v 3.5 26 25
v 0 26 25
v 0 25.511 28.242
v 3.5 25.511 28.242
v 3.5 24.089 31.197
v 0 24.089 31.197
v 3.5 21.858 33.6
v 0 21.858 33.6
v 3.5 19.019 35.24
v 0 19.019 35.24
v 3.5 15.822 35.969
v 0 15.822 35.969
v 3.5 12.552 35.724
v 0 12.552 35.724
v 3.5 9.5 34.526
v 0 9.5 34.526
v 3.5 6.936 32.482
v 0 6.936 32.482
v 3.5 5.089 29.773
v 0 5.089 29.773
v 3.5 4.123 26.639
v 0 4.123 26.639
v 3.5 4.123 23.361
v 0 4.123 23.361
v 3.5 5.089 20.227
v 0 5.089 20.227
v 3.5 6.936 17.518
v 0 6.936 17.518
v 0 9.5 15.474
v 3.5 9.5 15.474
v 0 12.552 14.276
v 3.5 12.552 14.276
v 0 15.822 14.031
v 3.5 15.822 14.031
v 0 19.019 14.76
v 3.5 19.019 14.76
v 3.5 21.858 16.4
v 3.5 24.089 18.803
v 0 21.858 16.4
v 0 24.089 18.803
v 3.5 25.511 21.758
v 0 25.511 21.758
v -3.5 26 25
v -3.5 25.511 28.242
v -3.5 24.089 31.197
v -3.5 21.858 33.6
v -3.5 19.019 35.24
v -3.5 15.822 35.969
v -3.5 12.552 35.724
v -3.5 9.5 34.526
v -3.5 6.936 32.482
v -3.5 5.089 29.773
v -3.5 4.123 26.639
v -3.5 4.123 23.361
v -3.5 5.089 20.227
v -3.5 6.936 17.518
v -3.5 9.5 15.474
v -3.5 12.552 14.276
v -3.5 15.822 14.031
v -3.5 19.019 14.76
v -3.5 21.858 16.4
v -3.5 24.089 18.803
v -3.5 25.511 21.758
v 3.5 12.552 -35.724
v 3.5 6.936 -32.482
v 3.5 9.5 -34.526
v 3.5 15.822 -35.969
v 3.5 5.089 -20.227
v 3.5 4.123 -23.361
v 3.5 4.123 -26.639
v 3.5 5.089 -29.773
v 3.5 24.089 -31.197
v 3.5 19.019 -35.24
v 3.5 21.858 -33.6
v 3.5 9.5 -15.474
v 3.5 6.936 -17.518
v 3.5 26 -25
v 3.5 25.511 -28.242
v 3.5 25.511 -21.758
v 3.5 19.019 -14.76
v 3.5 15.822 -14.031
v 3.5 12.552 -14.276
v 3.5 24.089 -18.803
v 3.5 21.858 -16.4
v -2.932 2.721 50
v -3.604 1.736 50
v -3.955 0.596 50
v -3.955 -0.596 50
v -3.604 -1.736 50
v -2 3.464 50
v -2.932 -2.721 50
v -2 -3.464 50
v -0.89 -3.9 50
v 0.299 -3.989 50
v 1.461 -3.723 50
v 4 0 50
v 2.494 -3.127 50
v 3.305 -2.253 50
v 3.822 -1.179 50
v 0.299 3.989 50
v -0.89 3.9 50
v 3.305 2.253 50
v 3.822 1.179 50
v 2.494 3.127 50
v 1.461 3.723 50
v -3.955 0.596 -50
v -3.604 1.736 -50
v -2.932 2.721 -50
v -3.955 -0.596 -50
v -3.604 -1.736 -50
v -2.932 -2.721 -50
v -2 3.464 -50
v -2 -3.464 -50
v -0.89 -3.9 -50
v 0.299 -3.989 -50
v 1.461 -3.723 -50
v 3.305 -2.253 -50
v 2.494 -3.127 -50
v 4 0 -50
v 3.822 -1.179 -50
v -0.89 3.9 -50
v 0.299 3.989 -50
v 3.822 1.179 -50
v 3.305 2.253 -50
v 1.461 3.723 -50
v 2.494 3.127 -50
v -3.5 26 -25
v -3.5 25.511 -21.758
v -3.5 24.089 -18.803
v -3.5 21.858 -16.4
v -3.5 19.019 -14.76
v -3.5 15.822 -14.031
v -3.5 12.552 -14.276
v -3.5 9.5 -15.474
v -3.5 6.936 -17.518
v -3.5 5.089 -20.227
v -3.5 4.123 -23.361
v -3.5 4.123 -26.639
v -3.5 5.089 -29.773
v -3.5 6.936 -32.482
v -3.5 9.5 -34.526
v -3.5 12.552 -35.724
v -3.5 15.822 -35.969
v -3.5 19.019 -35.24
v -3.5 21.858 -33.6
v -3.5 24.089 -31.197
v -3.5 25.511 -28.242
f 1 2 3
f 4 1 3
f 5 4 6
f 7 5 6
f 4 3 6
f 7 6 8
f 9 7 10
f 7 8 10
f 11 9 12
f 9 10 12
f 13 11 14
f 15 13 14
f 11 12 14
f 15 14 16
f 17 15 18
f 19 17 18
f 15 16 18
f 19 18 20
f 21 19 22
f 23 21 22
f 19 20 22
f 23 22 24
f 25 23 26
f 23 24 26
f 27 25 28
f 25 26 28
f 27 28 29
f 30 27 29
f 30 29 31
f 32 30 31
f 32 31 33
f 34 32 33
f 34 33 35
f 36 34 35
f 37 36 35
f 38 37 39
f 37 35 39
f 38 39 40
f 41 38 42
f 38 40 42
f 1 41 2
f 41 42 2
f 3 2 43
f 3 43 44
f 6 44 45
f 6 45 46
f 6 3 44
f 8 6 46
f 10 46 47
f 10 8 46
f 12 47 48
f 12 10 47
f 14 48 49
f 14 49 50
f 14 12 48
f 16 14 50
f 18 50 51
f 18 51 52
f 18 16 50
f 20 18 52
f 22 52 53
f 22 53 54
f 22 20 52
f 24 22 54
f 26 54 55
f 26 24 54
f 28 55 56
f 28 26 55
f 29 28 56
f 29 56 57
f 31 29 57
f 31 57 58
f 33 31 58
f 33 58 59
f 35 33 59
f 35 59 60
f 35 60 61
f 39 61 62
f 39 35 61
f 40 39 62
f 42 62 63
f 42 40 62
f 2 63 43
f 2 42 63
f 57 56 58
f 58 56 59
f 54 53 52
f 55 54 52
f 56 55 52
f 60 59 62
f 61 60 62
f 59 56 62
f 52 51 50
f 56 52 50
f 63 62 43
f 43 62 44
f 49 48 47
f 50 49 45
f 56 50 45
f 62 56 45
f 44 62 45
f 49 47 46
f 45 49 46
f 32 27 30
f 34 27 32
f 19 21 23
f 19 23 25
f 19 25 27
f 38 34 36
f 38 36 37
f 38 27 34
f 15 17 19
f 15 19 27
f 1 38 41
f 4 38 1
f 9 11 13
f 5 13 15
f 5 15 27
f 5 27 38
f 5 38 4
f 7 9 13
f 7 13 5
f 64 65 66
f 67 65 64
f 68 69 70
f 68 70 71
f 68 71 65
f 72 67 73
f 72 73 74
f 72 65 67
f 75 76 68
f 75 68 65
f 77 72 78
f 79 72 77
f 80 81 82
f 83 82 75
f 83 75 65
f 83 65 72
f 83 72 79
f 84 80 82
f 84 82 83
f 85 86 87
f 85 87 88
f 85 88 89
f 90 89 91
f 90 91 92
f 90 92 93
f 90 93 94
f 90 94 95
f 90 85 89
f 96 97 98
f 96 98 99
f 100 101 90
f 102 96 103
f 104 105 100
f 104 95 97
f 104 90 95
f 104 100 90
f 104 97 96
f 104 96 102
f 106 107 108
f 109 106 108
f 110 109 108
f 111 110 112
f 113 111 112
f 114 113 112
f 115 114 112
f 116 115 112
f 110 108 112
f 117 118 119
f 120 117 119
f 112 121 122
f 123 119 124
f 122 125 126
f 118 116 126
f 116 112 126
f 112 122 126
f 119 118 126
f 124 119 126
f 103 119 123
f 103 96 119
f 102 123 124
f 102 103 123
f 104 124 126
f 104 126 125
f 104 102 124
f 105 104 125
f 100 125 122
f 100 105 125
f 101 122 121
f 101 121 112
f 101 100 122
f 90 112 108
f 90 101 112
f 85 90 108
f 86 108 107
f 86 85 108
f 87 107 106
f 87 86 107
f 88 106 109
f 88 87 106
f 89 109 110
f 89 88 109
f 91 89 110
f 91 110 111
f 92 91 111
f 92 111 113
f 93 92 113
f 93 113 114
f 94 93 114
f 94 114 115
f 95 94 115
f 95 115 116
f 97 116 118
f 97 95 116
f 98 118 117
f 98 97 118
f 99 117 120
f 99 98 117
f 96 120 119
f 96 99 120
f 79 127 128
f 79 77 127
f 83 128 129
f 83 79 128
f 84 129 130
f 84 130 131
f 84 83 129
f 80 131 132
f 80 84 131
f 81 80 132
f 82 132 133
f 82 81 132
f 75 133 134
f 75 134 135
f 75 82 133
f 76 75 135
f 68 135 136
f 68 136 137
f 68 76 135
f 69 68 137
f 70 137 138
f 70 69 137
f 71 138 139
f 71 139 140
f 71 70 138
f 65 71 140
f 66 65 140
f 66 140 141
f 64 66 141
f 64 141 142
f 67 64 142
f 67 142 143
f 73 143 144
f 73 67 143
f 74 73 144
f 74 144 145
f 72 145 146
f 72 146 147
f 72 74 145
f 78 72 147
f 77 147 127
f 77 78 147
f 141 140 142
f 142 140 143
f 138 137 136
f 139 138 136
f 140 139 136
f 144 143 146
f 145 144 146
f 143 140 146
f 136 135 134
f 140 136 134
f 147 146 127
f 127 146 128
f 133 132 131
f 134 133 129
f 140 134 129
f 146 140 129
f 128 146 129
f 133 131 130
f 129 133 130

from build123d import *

# Parameters (mm, degrees)
F0_R     = 4
F1_DEPTH = 50
F3_R     = 11
F4_DEPTH = 3.5


with BuildPart() as f1:
    # F0 (on Top) → F1 (new body, symmetric)
    with BuildSketch(Plane.XY):
        Circle(F0_R)
    extrude(amount=F1_DEPTH, both=True)


with BuildPart() as f4:
    # F3 (on Right) → F4 (new body, symmetric)
    with BuildSketch(Plane.YZ):
        with Locations((15, 25)):
            Circle(F3_R)
        with Locations((15, -25)):
            Circle(F3_R)
    extrude(amount=F4_DEPTH, both=True)


solid = Compound([f1.part, f4.part])
